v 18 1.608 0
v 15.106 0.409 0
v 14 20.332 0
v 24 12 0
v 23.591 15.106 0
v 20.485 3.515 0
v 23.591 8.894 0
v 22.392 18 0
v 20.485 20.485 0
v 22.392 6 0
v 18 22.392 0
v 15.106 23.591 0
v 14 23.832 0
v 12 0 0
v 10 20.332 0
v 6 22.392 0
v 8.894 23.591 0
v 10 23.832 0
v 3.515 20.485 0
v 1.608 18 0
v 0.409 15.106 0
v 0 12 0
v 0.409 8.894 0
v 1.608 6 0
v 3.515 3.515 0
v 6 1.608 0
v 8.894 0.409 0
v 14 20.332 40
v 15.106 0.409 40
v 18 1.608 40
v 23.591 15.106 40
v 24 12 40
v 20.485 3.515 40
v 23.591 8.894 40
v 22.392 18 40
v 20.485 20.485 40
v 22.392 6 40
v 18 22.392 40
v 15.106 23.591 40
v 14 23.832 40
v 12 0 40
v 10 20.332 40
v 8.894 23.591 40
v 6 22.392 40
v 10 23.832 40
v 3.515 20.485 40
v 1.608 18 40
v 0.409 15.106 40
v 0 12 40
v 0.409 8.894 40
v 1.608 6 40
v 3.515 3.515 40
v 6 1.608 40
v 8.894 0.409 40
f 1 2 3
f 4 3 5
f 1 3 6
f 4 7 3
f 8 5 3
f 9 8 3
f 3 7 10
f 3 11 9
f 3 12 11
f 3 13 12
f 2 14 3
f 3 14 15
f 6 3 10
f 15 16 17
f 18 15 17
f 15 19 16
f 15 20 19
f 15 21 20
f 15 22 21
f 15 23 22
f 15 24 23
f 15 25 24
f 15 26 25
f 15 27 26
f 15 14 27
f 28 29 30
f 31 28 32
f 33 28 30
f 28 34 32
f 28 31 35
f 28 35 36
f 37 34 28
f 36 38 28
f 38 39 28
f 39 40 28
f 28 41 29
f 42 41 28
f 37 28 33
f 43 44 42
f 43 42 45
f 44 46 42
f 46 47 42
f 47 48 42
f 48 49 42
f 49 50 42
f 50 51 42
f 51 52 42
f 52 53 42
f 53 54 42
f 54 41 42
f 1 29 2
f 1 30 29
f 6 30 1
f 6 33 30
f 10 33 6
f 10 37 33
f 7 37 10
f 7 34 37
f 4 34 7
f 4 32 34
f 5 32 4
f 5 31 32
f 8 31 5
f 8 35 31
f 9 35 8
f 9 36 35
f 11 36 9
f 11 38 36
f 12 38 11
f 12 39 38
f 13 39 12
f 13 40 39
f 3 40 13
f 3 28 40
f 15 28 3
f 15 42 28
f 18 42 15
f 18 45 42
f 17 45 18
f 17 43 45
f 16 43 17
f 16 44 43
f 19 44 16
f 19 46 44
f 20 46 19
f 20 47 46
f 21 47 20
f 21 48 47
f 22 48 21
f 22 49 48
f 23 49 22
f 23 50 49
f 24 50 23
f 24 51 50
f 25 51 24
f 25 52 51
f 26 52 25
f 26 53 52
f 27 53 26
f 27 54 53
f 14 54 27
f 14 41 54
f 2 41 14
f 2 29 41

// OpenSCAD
$fn = 32;

// ----------------------------------------------------------------------
// Keyway shaft: d24 shaft, key 4 x 3.5 mm
// ----------------------------------------------------------------------

// --- parameters (mm) ---
shaft_r = 12;             // shaft radius
key_w = 4;                // keyway width
key_d = 3.5;              // keyway depth below the surface line
plate_t = 40;             // shaft length, Z (extrusion height)

shaft_d = 2 * shaft_r;  // shaft diameter
circle_step = 15;  // polygon sampling step, degrees

profile = [[8.894, 23.591], [6, 22.392], [3.515, 20.485], [1.608, 18], [0.409, 15.106], [0, 12], [0.409, 8.894], [1.608, 6], [3.515, 3.515], [6, 1.608], [8.894, 0.409], [12, 0], [15.106, 0.409], [18, 1.608], [20.485, 3.515], [22.392, 6], [23.591, 8.894], [24, 12], [23.591, 15.106], [22.392, 18], [20.485, 20.485], [18, 22.392], [15.106, 23.591], [14, 23.832], [14, 20.332], [10, 20.332], [10, 23.832]];  // primary outline, 27 points, counter clockwise

// --- the one profile operation ---
linear_extrude(height = plate_t) polygon(points = profile);
